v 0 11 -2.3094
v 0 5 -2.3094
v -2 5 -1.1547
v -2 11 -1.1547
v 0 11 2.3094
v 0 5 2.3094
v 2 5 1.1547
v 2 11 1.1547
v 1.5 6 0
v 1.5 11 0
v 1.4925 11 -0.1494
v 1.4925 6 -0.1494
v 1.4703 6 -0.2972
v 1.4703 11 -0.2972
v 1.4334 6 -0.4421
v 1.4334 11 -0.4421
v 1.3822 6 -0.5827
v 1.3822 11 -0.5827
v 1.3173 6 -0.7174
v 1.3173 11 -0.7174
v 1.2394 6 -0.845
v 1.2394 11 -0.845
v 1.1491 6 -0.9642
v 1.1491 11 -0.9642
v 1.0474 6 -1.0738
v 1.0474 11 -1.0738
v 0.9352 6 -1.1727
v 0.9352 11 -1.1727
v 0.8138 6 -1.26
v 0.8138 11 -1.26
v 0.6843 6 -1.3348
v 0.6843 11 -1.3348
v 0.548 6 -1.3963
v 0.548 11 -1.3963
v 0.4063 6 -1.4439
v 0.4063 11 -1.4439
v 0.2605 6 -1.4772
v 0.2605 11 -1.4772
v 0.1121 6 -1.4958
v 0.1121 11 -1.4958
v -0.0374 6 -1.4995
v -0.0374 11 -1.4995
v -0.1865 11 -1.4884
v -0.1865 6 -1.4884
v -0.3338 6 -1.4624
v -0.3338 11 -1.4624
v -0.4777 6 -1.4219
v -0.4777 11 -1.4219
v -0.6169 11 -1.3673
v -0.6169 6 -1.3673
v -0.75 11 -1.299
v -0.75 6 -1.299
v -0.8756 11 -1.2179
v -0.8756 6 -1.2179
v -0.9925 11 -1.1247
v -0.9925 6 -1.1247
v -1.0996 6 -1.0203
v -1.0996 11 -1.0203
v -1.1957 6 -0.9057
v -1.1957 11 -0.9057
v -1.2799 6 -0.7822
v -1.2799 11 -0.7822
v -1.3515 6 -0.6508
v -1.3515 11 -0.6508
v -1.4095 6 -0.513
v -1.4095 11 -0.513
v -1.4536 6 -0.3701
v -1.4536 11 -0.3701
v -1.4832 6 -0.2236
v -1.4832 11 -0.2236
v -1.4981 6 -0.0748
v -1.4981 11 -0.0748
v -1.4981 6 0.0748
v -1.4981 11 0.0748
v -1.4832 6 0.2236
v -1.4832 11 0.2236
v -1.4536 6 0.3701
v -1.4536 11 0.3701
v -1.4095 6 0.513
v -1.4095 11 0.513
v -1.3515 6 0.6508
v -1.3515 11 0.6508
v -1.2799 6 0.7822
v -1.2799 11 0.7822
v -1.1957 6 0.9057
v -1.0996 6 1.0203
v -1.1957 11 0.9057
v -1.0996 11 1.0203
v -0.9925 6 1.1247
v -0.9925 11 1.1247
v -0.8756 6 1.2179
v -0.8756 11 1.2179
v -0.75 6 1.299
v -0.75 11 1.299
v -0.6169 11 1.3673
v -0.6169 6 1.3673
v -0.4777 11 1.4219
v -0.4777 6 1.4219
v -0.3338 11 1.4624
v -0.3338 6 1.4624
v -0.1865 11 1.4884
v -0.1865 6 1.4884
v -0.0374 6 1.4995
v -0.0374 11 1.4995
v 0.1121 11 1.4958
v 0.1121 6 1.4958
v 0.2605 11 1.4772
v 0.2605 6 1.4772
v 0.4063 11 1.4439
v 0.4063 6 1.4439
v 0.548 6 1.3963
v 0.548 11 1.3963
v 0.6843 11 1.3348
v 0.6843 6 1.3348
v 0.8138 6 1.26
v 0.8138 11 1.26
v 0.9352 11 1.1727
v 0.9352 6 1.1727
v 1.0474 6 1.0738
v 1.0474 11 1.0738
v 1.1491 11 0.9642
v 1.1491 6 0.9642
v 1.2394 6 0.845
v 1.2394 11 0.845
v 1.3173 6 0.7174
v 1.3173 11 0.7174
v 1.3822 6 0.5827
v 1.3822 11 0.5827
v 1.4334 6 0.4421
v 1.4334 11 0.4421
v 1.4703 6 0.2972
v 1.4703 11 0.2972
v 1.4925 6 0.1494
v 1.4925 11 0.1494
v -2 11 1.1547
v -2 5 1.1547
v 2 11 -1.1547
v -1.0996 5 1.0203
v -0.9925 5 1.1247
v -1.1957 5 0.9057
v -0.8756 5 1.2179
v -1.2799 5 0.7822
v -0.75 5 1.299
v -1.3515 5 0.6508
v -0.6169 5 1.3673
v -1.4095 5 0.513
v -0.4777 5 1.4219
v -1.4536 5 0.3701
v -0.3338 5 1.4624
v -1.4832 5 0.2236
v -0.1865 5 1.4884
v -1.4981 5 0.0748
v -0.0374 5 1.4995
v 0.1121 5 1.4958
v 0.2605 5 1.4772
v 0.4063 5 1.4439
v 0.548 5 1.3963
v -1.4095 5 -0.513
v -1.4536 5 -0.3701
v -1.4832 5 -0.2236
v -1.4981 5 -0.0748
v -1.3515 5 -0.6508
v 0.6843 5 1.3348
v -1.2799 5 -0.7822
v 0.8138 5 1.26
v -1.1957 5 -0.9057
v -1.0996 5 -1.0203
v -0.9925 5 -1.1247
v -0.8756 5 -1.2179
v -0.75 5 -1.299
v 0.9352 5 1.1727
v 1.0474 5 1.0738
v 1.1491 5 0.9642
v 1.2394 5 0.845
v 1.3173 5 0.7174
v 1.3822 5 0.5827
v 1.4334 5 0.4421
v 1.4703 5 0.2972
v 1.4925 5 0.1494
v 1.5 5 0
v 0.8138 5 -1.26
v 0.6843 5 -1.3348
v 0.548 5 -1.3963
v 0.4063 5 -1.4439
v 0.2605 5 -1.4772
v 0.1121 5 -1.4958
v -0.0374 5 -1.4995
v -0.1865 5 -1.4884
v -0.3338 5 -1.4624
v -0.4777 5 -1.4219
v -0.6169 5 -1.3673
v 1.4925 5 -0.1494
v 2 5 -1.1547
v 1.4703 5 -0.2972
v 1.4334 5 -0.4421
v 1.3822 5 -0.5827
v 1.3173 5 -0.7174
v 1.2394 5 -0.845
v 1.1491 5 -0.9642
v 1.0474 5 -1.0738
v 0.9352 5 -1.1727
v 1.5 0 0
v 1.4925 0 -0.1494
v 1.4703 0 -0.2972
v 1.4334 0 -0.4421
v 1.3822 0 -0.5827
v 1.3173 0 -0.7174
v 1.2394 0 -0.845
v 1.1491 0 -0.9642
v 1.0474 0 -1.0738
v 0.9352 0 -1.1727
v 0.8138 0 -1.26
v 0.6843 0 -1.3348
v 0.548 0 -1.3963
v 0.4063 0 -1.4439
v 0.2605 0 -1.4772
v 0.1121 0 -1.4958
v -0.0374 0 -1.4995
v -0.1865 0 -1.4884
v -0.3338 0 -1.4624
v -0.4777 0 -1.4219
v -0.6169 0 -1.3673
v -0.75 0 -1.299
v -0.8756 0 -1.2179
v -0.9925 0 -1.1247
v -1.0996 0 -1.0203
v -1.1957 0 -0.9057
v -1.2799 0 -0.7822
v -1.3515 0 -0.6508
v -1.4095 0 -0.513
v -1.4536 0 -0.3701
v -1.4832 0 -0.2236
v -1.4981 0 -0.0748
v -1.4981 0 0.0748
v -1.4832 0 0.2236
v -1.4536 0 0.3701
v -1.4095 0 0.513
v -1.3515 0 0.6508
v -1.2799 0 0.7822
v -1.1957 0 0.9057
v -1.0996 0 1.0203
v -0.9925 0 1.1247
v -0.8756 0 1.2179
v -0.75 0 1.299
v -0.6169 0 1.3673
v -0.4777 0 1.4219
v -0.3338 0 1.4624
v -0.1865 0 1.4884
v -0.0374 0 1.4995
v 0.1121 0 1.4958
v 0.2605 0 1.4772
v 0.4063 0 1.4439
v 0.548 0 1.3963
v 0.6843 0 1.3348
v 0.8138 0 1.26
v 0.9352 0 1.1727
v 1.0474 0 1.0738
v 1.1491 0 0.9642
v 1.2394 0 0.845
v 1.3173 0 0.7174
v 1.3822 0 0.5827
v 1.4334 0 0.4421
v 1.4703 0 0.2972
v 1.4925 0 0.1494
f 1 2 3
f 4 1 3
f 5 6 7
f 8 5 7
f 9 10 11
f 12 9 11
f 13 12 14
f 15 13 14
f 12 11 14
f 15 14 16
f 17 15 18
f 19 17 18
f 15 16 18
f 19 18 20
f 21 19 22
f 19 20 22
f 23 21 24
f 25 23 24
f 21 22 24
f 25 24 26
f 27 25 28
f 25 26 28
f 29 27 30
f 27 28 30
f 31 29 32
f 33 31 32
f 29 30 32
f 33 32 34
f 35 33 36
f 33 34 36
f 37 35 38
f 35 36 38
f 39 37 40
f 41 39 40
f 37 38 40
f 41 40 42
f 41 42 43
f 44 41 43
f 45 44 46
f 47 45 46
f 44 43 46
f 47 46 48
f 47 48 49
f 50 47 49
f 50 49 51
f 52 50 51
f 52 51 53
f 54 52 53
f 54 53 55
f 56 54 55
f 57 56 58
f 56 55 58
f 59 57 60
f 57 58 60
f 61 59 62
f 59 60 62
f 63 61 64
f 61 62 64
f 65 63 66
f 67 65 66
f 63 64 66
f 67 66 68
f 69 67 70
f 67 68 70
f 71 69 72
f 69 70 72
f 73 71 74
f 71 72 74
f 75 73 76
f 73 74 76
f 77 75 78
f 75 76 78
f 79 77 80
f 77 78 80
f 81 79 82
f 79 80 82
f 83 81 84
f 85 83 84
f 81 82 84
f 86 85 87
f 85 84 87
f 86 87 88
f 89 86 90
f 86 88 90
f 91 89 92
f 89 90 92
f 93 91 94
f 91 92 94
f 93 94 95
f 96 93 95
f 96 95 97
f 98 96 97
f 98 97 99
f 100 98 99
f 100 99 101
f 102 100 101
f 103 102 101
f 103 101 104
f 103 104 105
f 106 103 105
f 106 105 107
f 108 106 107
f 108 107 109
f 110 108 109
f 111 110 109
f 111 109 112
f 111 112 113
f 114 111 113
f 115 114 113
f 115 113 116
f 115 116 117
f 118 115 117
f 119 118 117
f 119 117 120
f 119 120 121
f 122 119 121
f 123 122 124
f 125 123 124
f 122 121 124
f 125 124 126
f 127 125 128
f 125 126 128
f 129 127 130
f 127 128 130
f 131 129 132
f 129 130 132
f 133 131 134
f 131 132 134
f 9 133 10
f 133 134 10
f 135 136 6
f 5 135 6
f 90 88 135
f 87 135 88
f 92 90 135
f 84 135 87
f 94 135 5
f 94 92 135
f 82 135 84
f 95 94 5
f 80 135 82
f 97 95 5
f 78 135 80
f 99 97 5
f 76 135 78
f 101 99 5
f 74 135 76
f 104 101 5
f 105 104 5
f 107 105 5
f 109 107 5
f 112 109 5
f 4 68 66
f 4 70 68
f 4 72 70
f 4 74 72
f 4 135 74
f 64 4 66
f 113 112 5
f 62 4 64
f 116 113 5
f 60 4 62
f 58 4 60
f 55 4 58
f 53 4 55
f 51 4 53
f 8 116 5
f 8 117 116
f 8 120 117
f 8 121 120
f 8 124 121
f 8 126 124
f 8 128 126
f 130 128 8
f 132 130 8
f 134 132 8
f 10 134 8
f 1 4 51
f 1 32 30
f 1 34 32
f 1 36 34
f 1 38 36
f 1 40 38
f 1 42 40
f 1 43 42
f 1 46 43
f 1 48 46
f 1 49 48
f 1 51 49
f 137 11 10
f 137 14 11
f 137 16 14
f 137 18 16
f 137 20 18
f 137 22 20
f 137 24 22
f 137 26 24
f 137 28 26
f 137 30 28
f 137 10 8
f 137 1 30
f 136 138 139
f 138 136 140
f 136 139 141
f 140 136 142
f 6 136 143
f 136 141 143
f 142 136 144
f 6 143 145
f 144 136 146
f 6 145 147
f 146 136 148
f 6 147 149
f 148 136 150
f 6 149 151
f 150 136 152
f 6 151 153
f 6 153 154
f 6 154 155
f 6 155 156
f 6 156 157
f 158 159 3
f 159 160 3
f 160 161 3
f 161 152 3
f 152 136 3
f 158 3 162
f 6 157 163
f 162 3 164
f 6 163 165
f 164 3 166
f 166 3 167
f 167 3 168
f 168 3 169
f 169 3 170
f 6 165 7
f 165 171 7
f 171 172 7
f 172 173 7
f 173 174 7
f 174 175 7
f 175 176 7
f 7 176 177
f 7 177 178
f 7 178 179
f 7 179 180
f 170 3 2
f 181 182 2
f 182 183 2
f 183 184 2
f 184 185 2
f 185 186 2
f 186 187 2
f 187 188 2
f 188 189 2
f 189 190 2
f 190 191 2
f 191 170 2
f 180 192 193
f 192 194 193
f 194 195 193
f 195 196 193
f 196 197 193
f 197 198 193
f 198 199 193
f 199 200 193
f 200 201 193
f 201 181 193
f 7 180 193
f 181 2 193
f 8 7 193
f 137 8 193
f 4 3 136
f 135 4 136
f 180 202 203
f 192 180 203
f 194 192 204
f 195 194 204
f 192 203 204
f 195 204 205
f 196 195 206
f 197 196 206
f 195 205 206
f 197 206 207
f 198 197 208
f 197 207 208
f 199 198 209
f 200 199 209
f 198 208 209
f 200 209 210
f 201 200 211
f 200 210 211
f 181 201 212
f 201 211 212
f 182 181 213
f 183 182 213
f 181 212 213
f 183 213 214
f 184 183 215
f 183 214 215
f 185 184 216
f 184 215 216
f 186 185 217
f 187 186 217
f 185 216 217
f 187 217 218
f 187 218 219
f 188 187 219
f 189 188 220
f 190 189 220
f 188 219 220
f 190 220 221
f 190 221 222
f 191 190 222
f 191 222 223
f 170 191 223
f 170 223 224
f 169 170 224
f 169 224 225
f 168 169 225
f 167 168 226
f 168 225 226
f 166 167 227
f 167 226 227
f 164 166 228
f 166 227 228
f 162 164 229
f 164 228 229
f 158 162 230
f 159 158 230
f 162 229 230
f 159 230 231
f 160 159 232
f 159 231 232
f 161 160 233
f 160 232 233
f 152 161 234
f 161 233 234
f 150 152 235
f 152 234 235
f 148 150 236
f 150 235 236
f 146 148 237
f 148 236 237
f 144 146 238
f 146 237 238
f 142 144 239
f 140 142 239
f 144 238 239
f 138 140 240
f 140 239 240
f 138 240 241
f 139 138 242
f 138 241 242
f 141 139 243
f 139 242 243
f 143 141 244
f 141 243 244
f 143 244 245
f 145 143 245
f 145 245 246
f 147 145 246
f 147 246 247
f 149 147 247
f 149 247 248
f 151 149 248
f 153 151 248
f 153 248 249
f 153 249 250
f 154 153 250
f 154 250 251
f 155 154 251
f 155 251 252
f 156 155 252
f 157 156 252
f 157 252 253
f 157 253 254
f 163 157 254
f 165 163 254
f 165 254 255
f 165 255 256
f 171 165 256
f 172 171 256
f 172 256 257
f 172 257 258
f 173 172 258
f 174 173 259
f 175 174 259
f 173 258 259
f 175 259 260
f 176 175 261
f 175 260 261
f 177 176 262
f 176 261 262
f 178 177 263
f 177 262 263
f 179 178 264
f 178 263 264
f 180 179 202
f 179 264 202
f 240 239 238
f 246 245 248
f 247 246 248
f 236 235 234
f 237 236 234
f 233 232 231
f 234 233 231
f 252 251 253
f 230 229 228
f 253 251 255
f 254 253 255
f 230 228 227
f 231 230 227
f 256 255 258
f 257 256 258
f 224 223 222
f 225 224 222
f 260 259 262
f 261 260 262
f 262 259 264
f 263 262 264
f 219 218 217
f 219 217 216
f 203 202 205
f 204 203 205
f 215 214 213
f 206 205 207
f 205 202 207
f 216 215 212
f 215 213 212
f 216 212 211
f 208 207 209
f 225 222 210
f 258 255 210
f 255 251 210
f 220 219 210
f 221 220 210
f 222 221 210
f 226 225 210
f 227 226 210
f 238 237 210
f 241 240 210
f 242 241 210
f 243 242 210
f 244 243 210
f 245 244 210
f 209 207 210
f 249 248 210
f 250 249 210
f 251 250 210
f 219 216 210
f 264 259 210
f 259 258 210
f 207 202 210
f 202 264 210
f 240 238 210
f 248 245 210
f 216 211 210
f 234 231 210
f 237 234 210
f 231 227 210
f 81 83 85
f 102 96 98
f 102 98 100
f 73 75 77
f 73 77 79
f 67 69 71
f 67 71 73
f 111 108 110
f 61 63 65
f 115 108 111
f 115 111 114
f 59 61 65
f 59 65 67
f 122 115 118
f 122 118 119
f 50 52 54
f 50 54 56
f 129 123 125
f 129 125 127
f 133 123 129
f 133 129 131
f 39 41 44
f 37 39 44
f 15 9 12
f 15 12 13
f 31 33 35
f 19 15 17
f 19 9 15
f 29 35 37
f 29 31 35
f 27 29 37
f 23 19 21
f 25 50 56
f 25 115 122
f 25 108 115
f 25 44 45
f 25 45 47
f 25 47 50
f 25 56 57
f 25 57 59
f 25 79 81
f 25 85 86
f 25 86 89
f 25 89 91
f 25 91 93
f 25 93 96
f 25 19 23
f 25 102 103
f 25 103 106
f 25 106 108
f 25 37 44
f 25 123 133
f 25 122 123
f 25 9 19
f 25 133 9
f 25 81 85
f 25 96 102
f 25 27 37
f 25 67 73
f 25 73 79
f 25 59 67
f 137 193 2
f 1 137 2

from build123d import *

# Parameters (mm, degrees)
SKETCH_1_R          = 1.5
EXTRUDE_1_DEPTH     = 5
EXTRUDE_2_DEPTH     = 6
SKETCH_3_R          = 1.5
CUT_EXTRUDE_1_DEPTH = 5


with BuildPart() as part:
    # 草图1 → 凸台-拉伸1 (new body)
    with BuildSketch(Plane(origin=(0, 0, 0), x_dir=(1, 0, 0), z_dir=(0, 1, 0))):
        Circle(SKETCH_1_R)
    extrude(amount=EXTRUDE_1_DEPTH)

    # 草图2 → 凸台-拉伸2 (add)
    with BuildSketch(Plane(origin=(0, 5, 0), x_dir=(1, 0, 0), z_dir=(0, 1, 0))):
        Polygon((0, 2.309401077), (-2, 1.154700538), (-2, -1.154700538), (0, -2.309401077), (2, -1.154700538), (2, 1.154700538), align=None)
    extrude(amount=EXTRUDE_2_DEPTH)

    # 草图3 → 切除-拉伸1 (cut)
    with BuildSketch(Plane(origin=(0, 11, 0), x_dir=(1, 0, 0), z_dir=(0, 1, 0))):
        Circle(SKETCH_3_R)
    extrude(amount=-CUT_EXTRUDE_1_DEPTH, mode=Mode.SUBTRACT)


solid = part.part
